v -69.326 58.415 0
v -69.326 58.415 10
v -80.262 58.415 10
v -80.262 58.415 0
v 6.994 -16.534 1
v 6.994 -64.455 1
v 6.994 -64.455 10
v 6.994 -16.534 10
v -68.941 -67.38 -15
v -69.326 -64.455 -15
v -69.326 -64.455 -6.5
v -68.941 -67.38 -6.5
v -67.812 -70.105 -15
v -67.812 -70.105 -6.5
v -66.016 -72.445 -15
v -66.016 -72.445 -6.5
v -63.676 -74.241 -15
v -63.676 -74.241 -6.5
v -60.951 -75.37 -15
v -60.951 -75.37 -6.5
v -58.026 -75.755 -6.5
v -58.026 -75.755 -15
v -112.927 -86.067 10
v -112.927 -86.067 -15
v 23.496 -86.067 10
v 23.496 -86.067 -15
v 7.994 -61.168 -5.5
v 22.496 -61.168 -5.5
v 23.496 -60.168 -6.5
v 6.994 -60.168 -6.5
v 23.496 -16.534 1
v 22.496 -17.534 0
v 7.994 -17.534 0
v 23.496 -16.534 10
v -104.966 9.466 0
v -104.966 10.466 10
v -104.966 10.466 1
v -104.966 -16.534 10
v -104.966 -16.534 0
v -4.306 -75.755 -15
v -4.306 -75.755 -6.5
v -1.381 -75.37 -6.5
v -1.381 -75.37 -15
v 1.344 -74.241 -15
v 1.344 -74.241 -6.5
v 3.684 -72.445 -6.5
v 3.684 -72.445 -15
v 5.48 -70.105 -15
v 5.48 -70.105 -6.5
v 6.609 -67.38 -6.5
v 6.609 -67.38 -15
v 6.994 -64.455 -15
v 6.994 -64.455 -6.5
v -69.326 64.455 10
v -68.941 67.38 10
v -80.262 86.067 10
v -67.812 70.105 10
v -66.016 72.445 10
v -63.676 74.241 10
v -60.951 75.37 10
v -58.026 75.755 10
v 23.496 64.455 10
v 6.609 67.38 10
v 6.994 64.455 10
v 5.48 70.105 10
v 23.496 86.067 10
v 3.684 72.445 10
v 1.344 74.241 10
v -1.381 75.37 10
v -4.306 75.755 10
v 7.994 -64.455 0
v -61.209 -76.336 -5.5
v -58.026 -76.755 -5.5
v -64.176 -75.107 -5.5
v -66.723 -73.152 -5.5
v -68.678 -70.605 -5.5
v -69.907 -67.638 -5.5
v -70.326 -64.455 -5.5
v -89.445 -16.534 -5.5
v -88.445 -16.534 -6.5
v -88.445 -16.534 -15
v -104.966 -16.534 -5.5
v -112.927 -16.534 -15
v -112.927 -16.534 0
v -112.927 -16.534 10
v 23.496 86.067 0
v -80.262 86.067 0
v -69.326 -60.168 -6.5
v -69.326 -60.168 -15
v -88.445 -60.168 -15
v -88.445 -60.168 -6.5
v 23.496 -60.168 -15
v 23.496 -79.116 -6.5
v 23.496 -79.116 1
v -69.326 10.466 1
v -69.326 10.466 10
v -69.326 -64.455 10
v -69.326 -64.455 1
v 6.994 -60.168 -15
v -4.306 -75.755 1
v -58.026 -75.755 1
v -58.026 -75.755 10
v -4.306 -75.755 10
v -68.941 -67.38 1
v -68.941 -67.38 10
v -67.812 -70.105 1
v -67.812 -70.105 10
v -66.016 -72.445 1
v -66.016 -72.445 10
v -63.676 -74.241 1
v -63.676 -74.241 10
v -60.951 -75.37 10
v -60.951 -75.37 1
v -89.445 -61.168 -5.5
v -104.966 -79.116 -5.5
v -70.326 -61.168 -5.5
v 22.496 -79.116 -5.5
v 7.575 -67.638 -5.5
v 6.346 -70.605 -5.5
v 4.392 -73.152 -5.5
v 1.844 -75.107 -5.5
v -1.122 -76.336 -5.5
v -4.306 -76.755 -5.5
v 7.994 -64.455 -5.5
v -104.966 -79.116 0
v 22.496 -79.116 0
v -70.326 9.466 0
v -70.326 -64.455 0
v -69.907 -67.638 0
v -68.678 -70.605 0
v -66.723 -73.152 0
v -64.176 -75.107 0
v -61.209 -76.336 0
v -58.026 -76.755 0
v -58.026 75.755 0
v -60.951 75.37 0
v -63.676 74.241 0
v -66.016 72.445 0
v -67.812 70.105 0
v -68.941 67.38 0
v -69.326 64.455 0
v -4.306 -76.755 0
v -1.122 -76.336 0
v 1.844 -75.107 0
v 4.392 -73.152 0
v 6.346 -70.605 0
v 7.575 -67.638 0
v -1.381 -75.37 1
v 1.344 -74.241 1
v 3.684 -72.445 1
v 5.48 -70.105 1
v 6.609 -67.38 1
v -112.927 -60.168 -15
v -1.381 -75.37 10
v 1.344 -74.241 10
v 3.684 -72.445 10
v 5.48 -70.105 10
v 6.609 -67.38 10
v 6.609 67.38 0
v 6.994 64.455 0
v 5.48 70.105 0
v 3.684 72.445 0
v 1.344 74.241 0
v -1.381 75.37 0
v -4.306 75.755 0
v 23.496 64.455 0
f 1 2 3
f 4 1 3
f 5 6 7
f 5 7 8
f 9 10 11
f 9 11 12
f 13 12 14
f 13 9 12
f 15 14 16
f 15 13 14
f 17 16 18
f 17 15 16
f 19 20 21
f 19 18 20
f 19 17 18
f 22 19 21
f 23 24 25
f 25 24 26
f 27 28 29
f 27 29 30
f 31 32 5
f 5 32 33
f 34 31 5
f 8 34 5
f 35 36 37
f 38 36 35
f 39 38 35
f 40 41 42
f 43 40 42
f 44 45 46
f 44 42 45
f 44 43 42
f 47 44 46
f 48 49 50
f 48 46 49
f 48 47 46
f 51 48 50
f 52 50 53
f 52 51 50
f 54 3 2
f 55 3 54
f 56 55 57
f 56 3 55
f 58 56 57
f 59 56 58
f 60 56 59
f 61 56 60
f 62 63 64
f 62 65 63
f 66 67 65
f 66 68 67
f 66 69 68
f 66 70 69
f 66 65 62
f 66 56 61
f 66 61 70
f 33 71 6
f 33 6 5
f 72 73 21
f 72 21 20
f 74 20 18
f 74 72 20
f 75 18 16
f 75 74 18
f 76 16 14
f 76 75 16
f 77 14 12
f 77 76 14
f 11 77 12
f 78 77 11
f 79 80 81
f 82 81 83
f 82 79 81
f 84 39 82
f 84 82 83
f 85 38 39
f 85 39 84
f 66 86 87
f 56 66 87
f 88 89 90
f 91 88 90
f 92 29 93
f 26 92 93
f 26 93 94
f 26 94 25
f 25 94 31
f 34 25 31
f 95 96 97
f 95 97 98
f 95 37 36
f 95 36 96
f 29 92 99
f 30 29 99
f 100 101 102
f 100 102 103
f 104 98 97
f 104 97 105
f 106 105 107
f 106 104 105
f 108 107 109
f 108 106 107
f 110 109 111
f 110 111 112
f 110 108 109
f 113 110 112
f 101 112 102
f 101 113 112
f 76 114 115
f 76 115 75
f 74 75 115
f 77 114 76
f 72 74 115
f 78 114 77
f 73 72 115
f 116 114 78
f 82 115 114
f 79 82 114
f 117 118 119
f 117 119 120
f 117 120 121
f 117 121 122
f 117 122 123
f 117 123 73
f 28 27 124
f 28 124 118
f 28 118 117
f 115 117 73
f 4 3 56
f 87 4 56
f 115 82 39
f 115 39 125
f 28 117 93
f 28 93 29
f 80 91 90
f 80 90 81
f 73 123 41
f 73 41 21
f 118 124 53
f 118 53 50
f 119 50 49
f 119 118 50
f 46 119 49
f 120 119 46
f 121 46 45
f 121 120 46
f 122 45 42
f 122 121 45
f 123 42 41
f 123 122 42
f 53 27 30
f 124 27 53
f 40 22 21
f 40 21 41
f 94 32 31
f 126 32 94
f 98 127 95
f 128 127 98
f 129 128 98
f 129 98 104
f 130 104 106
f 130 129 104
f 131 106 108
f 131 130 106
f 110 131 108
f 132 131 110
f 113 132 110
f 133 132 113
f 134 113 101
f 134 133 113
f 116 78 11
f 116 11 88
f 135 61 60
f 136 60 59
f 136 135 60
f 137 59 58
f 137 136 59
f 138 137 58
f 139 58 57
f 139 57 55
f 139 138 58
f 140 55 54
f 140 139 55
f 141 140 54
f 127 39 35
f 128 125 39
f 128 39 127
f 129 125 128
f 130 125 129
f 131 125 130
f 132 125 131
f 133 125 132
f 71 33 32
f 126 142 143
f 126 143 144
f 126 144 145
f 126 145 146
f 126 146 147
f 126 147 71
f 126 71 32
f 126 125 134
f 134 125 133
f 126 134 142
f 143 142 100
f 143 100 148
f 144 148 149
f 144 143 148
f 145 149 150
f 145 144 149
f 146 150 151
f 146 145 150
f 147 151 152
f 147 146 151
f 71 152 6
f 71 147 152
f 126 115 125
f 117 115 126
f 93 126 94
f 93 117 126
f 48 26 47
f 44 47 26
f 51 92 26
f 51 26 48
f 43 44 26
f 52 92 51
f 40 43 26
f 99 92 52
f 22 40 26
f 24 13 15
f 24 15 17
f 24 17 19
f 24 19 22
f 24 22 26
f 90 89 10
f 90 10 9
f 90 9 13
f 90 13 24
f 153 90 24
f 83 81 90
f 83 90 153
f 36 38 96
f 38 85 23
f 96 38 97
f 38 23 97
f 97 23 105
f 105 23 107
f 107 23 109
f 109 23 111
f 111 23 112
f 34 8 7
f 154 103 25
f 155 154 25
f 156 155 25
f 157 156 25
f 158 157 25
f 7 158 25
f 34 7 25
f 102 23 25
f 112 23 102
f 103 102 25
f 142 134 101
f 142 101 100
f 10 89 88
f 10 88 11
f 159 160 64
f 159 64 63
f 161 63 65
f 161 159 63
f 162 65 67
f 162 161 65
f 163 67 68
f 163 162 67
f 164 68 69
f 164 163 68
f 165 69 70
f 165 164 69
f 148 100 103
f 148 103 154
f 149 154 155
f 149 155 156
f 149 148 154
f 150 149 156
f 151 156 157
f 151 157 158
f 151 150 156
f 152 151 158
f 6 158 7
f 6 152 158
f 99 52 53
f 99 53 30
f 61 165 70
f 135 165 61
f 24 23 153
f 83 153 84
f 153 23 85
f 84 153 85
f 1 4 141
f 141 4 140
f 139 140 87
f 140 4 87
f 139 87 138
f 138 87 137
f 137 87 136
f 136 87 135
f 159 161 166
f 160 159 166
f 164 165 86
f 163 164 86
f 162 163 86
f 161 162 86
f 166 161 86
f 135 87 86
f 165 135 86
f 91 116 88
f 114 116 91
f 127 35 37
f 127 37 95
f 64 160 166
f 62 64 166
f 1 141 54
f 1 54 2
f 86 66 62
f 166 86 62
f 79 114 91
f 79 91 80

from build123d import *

# Parameters (mm, degrees)
BOSS_EXTRUDE1_DEPTH = 10
BOSS_EXTRUDE2_START = -15
BOSS_EXTRUDE2_DEPTH = 15
CUT_EXTRUDE2_START  = -25
CUT_EXTRUDE2_DEPTH  = 25
SKETCH9_W           = 12.32377621
SKETCH9_H           = 20.190011783
SKETCH9_W_2         = 8.082915928
SKETCH9_H_2         = 19.897693181
SKETCH9_W_3         = 27.099227996
SKETCH9_H_3         = 21.612440871
SKETCH9_H_4         = 69.53388311
CUT_EXTRUDE3_DEPTH  = 51
SKETCH11_W          = 24.481918607
SKETCH11_H          = 43.634366614
BOSS_EXTRUDE4_DEPTH = 15
CAVITY3_START       = -5.5
CAVITY3_DEPTH       = 5.5
CUT_EXTRUDE4_DEPTH  = 10
SKETCH16_W          = 35.640039366
SKETCH16_H          = 10
BOSS_EXTRUDE8_DEPTH = 27
CHAMFER1_SIZE       = 1


# Read off the part's stored shape, not the designer's step: Cavity3
with BuildPart() as part:
    # Sketch2 → Boss-Extrude1 (new body)
    with BuildSketch(Plane.XY):
        with BuildLine():
            ThreePointArc((-69.025908971, 64.455), (-65.804083564, 72.233174593), (-58.025908971, 75.455))
            Line((-58.025908971, 75.455), (-4.305908971, 75.455))
            ThreePointArc((-4.305908971, 75.455), (3.472265622, 72.233174593), (6.694091029, 64.455))
            Line((6.694091029, 64.455), (50.59484207, 64.455))
            Line((50.59484207, 64.455), (50.59484207, 86.067440871))
            Line((50.59484207, 86.067440871), (-112.926660012, 86.067440871))
            Line((-112.926660012, 86.067440871), (-112.926660012, -86.067440871))
            Line((-112.926660012, -86.067440871), (50.59484207, -86.067440871))
            Line((50.59484207, -86.067440871), (50.59484207, -16.533557761))
            Line((50.59484207, -16.533557761), (6.694091029, -16.533557761))
            Line((6.694091029, -16.533557761), (6.694091029, -64.455))
            ThreePointArc((6.694091029, -64.455), (3.472265622, -72.233174593), (-4.305908971, -75.455))
            Line((-4.305908971, -75.455), (-58.025908971, -75.455))
            ThreePointArc((-58.025908971, -75.455), (-65.804083564, -72.233174593), (-69.025908971, -64.455))
            Line((-69.025908971, -64.455), (-69.025908971, 16.297314801))
            Line((-69.025908971, 16.297314801), (6.694091029, 16.297314801))
            Line((6.694091029, 16.297314801), (6.694091029, 33.387471945))
            Line((6.694091029, 33.387471945), (-69.025908971, 33.387471945))
            Line((-69.025908971, 33.387471945), (-69.025908971, 64.455))
        make_face()
    extrude(amount=BOSS_EXTRUDE1_DEPTH)

    # Sketch2<3> → Boss-Extrude2 (add)
    with BuildSketch(Plane.XY.offset(BOSS_EXTRUDE2_START)):
        with BuildLine():
            Line((-69.025908971, -60.167924375), (-112.926660012, -60.167924375))
            Line((-112.926660012, -60.167924375), (-112.926660012, -86.067440871))
            Line((-112.926660012, -86.067440871), (50.59484207, -86.067440871))
            Line((50.59484207, -86.067440871), (50.59484207, -60.167924375))
            Line((50.59484207, -60.167924375), (6.694091029, -60.167924375))
            Line((6.694091029, -60.167924375), (6.694091029, -64.455))
            ThreePointArc((6.694091029, -64.455), (3.472265622, -72.233174593), (-4.305908971, -75.455))
            Line((-4.305908971, -75.455), (-58.025908971, -75.455))
            ThreePointArc((-58.025908971, -75.455), (-65.804083564, -72.233174593), (-69.025908971, -64.455))
            Line((-69.025908971, -64.455), (-69.025908971, -60.167924375))
        make_face()
    extrude(amount=BOSS_EXTRUDE2_DEPTH)

    # Sketch7 → Cut-Extrude2 (cut)
    with BuildSketch(Plane.XY.offset(10).offset(CUT_EXTRUDE2_START)):
        with BuildLine():
            Line((-69.325908971, 33.387471945), (-69.325908971, 16.297314801))
            Line((-69.325908971, 16.297314801), (-69.325908971, -64.455))
            ThreePointArc((-69.325908971, -64.455), (-66.016215599, -72.445306627), (-58.025908971, -75.755))
            Line((-58.025908971, -75.755), (-4.305908971, -75.755))
            ThreePointArc((-4.305908971, -75.755), (3.684397656, -72.445306627), (6.994091029, -64.455))
            Line((6.994091029, -64.455), (6.994091029, -16.533557761))
            Line((6.994091029, -16.533557761), (6.994091029, 64.455))
            ThreePointArc((6.994091029, 64.455), (3.684397656, 72.445306627), (-4.305908971, 75.755))
            Line((-4.305908971, 75.755), (-58.025908971, 75.755))
            ThreePointArc((-58.025908971, 75.755), (-66.016215599, 72.445306627), (-69.325908971, 64.455))
            Line((-69.325908971, 64.455), (-69.325908971, 33.387471945))
        make_face()
    extrude(amount=CUT_EXTRUDE2_DEPTH, mode=Mode.SUBTRACT)

    # Sketch9 → Cut-Extrude3 (cut)
    with BuildSketch(Plane.XY.offset(10)):
        with Locations((-106.764771907, 13.459141312)):
            Rectangle(SKETCH9_W, SKETCH9_H)
        with Locations((-116.968117976, 13.459141312)):
            Rectangle(SKETCH9_W_2, SKETCH9_H)
        Polygon((-122.798498513, -16.533557761), (-112.926660012, -16.533557761), (-112.926660012, 3.36413542), (-121.00957594, 3.36413542), (-121.00957594, 23.554147203), (-122.798498513, 23.554147203), align=None)
        with Locations((-106.764771907, -6.584711171)):
            Rectangle(SKETCH9_W, SKETCH9_H_2)
        Polygon((-100.602883802, 23.554147203), (-100.602883802, 3.36413542), (-80.261895125, 3.36413542), (-80.261895125, 86.067440871), (-112.926660012, 86.067440871), (-112.926660012, 23.554147203), align=None)
        Polygon((50.59484207, -86.067440871), (23.495614074, -86.067440871), (23.495614074, -98.291356894), (80.343598041, -98.291356894), (80.343598041, 92.328281653), (23.495614074, 92.328281653), (23.495614074, 86.067440871), (50.59484207, 86.067440871), (50.59484207, 64.455), (23.495614074, 64.455), (23.495614074, -16.533557761), (50.59484207, -16.533557761), align=None)
        with Locations((37.045228072, 75.261220436)):
            Rectangle(SKETCH9_W_3, SKETCH9_H_3)
        with Locations((37.045228072, -51.300499316)):
            Rectangle(SKETCH9_W_3, SKETCH9_H_4)
    extrude(amount=-CUT_EXTRUDE3_DEPTH, mode=Mode.SUBTRACT)

    # Sketch11 → Boss-Extrude4 (add)
    with BuildSketch(Plane(origin=(0, 0, 0), x_dir=(-1, 0, 0), z_dir=(0, 0, -1))):
        with Locations((100.685700709, -38.350741068)):
            Rectangle(SKETCH11_W, SKETCH11_H)
    extrude(amount=BOSS_EXTRUDE4_DEPTH)

    # Cavity3 outline → Cavity3 (cut)
    with BuildSketch(Plane.XY.offset(CAVITY3_START)):
        with BuildLine():
            Line((-104.965948337, -79.115579866), (23.495614074, -79.115579866))
            Line((23.495614074, -79.115579866), (23.495614074, -60.167924375))
            Line((23.495614074, -60.167924375), (6.994091029, -60.167924375))
            Line((6.994091029, -60.167924375), (6.994091029, -64.455))
            ThreePointArc((6.994091029, -64.455), (3.684397656, -72.445306627), (-4.305908971, -75.755))
            Line((-4.305908971, -75.755), (-58.025908971, -75.755))
            ThreePointArc((-58.025908971, -75.755), (-66.016215598, -72.445306628), (-69.325908971, -64.455))
            Line((-69.325908971, -64.455), (-69.325908971, -60.167924375))
            Line((-69.325908971, -60.167924375), (-88.444741405, -60.167924375))
            Line((-88.444741405, -60.167924375), (-88.444741405, -16.533557761))
            Line((-88.444741405, -16.533557761), (-104.965948337, -16.533557761))
            Line((-104.965948337, -16.533557761), (-104.965948337, -79.115579866))
        make_face()
    extrude(amount=CAVITY3_DEPTH, mode=Mode.SUBTRACT)

    # Sketch14 → Cut-Extrude4 (cut)
    with BuildSketch(Plane.XY.offset(10)):
        with BuildLine():
            Line((-100.172122713, 9.640304973), (-55.174695682, 9.640304973))
            Line((-55.174695682, 9.640304973), (-55.174695682, 58.414674309))
            Line((-55.174695682, 58.414674309), (-93.172122713, 58.414674309))
            ThreePointArc((-93.172122713, 58.414674309), (-98.121870182, 56.364421777), (-100.172122713, 51.414674309))
            Line((-100.172122713, 51.414674309), (-100.172122713, 9.640304973))
        make_face()
    extrude(amount=-CUT_EXTRUDE4_DEPTH, mode=Mode.SUBTRACT)


with BuildPart() as cut_extrude4_piece_1:
    # of the separate pieces the step leaves, piece 1, a body of its own (cut_extrude4_pieces)
    add(part.part.solids().sort_by_distance((-100.602883802, -16.533557761, 0))[0])

    # Sketch16 → Boss-Extrude8 (add)
    with BuildSketch(Plane(origin=(0, -16.533557761, 0), x_dir=(1, 0, 0), z_dir=(0, 1, 0))):
        with Locations((-87.145928654, -5)):
            Rectangle(SKETCH16_W, SKETCH16_H)
    extrude(amount=BOSS_EXTRUDE8_DEPTH)

    # Chamfer1
    chamfer1_edges = [cut_extrude4_piece_1.edges().sort_by_distance(p)[0] for p in [
        (-78.885325188, -60.167924375, -5.5),
        (-69.325908971, -26.99427888, 0),
        (-66.016215598, -72.445306628, 0),
        (-31.165908971, -75.755, 0),
        (3.684397656, -72.445306627, 0),
        (6.994091029, -38.350741068, 0),
        (15.244852551, -16.533557761, 0),
        (23.495614074, -47.824568813, 0),
        (15.244852551, -60.167924375, -5.5),
        (-69.325908971, -62.311462187, -5.5),
        (3.684397656, -72.445306627, -5.5),
        (-87.145928654, 10.466442239, 0),
        (-31.165908971, -75.755, -5.5),
        (-66.016215598, -72.445306628, -5.5),
        (6.994091029, -62.311462187, -5.5),
        (23.495614074, -69.641752121, -5.5),
        (-88.444741405, -38.350741068, -5.5),
    ]]
    chamfer(chamfer1_edges, length=CHAMFER1_SIZE)


with BuildPart() as cut_extrude4_piece_2:
    # of the separate pieces the step leaves, piece 2, a body of its own (cut_extrude4_pieces)
    add(part.part.solids().sort_by_distance((-80.261895125, 58.414674309, 0))[0])


solid = Compound([cut_extrude4_piece_1.part, cut_extrude4_piece_2.part])
